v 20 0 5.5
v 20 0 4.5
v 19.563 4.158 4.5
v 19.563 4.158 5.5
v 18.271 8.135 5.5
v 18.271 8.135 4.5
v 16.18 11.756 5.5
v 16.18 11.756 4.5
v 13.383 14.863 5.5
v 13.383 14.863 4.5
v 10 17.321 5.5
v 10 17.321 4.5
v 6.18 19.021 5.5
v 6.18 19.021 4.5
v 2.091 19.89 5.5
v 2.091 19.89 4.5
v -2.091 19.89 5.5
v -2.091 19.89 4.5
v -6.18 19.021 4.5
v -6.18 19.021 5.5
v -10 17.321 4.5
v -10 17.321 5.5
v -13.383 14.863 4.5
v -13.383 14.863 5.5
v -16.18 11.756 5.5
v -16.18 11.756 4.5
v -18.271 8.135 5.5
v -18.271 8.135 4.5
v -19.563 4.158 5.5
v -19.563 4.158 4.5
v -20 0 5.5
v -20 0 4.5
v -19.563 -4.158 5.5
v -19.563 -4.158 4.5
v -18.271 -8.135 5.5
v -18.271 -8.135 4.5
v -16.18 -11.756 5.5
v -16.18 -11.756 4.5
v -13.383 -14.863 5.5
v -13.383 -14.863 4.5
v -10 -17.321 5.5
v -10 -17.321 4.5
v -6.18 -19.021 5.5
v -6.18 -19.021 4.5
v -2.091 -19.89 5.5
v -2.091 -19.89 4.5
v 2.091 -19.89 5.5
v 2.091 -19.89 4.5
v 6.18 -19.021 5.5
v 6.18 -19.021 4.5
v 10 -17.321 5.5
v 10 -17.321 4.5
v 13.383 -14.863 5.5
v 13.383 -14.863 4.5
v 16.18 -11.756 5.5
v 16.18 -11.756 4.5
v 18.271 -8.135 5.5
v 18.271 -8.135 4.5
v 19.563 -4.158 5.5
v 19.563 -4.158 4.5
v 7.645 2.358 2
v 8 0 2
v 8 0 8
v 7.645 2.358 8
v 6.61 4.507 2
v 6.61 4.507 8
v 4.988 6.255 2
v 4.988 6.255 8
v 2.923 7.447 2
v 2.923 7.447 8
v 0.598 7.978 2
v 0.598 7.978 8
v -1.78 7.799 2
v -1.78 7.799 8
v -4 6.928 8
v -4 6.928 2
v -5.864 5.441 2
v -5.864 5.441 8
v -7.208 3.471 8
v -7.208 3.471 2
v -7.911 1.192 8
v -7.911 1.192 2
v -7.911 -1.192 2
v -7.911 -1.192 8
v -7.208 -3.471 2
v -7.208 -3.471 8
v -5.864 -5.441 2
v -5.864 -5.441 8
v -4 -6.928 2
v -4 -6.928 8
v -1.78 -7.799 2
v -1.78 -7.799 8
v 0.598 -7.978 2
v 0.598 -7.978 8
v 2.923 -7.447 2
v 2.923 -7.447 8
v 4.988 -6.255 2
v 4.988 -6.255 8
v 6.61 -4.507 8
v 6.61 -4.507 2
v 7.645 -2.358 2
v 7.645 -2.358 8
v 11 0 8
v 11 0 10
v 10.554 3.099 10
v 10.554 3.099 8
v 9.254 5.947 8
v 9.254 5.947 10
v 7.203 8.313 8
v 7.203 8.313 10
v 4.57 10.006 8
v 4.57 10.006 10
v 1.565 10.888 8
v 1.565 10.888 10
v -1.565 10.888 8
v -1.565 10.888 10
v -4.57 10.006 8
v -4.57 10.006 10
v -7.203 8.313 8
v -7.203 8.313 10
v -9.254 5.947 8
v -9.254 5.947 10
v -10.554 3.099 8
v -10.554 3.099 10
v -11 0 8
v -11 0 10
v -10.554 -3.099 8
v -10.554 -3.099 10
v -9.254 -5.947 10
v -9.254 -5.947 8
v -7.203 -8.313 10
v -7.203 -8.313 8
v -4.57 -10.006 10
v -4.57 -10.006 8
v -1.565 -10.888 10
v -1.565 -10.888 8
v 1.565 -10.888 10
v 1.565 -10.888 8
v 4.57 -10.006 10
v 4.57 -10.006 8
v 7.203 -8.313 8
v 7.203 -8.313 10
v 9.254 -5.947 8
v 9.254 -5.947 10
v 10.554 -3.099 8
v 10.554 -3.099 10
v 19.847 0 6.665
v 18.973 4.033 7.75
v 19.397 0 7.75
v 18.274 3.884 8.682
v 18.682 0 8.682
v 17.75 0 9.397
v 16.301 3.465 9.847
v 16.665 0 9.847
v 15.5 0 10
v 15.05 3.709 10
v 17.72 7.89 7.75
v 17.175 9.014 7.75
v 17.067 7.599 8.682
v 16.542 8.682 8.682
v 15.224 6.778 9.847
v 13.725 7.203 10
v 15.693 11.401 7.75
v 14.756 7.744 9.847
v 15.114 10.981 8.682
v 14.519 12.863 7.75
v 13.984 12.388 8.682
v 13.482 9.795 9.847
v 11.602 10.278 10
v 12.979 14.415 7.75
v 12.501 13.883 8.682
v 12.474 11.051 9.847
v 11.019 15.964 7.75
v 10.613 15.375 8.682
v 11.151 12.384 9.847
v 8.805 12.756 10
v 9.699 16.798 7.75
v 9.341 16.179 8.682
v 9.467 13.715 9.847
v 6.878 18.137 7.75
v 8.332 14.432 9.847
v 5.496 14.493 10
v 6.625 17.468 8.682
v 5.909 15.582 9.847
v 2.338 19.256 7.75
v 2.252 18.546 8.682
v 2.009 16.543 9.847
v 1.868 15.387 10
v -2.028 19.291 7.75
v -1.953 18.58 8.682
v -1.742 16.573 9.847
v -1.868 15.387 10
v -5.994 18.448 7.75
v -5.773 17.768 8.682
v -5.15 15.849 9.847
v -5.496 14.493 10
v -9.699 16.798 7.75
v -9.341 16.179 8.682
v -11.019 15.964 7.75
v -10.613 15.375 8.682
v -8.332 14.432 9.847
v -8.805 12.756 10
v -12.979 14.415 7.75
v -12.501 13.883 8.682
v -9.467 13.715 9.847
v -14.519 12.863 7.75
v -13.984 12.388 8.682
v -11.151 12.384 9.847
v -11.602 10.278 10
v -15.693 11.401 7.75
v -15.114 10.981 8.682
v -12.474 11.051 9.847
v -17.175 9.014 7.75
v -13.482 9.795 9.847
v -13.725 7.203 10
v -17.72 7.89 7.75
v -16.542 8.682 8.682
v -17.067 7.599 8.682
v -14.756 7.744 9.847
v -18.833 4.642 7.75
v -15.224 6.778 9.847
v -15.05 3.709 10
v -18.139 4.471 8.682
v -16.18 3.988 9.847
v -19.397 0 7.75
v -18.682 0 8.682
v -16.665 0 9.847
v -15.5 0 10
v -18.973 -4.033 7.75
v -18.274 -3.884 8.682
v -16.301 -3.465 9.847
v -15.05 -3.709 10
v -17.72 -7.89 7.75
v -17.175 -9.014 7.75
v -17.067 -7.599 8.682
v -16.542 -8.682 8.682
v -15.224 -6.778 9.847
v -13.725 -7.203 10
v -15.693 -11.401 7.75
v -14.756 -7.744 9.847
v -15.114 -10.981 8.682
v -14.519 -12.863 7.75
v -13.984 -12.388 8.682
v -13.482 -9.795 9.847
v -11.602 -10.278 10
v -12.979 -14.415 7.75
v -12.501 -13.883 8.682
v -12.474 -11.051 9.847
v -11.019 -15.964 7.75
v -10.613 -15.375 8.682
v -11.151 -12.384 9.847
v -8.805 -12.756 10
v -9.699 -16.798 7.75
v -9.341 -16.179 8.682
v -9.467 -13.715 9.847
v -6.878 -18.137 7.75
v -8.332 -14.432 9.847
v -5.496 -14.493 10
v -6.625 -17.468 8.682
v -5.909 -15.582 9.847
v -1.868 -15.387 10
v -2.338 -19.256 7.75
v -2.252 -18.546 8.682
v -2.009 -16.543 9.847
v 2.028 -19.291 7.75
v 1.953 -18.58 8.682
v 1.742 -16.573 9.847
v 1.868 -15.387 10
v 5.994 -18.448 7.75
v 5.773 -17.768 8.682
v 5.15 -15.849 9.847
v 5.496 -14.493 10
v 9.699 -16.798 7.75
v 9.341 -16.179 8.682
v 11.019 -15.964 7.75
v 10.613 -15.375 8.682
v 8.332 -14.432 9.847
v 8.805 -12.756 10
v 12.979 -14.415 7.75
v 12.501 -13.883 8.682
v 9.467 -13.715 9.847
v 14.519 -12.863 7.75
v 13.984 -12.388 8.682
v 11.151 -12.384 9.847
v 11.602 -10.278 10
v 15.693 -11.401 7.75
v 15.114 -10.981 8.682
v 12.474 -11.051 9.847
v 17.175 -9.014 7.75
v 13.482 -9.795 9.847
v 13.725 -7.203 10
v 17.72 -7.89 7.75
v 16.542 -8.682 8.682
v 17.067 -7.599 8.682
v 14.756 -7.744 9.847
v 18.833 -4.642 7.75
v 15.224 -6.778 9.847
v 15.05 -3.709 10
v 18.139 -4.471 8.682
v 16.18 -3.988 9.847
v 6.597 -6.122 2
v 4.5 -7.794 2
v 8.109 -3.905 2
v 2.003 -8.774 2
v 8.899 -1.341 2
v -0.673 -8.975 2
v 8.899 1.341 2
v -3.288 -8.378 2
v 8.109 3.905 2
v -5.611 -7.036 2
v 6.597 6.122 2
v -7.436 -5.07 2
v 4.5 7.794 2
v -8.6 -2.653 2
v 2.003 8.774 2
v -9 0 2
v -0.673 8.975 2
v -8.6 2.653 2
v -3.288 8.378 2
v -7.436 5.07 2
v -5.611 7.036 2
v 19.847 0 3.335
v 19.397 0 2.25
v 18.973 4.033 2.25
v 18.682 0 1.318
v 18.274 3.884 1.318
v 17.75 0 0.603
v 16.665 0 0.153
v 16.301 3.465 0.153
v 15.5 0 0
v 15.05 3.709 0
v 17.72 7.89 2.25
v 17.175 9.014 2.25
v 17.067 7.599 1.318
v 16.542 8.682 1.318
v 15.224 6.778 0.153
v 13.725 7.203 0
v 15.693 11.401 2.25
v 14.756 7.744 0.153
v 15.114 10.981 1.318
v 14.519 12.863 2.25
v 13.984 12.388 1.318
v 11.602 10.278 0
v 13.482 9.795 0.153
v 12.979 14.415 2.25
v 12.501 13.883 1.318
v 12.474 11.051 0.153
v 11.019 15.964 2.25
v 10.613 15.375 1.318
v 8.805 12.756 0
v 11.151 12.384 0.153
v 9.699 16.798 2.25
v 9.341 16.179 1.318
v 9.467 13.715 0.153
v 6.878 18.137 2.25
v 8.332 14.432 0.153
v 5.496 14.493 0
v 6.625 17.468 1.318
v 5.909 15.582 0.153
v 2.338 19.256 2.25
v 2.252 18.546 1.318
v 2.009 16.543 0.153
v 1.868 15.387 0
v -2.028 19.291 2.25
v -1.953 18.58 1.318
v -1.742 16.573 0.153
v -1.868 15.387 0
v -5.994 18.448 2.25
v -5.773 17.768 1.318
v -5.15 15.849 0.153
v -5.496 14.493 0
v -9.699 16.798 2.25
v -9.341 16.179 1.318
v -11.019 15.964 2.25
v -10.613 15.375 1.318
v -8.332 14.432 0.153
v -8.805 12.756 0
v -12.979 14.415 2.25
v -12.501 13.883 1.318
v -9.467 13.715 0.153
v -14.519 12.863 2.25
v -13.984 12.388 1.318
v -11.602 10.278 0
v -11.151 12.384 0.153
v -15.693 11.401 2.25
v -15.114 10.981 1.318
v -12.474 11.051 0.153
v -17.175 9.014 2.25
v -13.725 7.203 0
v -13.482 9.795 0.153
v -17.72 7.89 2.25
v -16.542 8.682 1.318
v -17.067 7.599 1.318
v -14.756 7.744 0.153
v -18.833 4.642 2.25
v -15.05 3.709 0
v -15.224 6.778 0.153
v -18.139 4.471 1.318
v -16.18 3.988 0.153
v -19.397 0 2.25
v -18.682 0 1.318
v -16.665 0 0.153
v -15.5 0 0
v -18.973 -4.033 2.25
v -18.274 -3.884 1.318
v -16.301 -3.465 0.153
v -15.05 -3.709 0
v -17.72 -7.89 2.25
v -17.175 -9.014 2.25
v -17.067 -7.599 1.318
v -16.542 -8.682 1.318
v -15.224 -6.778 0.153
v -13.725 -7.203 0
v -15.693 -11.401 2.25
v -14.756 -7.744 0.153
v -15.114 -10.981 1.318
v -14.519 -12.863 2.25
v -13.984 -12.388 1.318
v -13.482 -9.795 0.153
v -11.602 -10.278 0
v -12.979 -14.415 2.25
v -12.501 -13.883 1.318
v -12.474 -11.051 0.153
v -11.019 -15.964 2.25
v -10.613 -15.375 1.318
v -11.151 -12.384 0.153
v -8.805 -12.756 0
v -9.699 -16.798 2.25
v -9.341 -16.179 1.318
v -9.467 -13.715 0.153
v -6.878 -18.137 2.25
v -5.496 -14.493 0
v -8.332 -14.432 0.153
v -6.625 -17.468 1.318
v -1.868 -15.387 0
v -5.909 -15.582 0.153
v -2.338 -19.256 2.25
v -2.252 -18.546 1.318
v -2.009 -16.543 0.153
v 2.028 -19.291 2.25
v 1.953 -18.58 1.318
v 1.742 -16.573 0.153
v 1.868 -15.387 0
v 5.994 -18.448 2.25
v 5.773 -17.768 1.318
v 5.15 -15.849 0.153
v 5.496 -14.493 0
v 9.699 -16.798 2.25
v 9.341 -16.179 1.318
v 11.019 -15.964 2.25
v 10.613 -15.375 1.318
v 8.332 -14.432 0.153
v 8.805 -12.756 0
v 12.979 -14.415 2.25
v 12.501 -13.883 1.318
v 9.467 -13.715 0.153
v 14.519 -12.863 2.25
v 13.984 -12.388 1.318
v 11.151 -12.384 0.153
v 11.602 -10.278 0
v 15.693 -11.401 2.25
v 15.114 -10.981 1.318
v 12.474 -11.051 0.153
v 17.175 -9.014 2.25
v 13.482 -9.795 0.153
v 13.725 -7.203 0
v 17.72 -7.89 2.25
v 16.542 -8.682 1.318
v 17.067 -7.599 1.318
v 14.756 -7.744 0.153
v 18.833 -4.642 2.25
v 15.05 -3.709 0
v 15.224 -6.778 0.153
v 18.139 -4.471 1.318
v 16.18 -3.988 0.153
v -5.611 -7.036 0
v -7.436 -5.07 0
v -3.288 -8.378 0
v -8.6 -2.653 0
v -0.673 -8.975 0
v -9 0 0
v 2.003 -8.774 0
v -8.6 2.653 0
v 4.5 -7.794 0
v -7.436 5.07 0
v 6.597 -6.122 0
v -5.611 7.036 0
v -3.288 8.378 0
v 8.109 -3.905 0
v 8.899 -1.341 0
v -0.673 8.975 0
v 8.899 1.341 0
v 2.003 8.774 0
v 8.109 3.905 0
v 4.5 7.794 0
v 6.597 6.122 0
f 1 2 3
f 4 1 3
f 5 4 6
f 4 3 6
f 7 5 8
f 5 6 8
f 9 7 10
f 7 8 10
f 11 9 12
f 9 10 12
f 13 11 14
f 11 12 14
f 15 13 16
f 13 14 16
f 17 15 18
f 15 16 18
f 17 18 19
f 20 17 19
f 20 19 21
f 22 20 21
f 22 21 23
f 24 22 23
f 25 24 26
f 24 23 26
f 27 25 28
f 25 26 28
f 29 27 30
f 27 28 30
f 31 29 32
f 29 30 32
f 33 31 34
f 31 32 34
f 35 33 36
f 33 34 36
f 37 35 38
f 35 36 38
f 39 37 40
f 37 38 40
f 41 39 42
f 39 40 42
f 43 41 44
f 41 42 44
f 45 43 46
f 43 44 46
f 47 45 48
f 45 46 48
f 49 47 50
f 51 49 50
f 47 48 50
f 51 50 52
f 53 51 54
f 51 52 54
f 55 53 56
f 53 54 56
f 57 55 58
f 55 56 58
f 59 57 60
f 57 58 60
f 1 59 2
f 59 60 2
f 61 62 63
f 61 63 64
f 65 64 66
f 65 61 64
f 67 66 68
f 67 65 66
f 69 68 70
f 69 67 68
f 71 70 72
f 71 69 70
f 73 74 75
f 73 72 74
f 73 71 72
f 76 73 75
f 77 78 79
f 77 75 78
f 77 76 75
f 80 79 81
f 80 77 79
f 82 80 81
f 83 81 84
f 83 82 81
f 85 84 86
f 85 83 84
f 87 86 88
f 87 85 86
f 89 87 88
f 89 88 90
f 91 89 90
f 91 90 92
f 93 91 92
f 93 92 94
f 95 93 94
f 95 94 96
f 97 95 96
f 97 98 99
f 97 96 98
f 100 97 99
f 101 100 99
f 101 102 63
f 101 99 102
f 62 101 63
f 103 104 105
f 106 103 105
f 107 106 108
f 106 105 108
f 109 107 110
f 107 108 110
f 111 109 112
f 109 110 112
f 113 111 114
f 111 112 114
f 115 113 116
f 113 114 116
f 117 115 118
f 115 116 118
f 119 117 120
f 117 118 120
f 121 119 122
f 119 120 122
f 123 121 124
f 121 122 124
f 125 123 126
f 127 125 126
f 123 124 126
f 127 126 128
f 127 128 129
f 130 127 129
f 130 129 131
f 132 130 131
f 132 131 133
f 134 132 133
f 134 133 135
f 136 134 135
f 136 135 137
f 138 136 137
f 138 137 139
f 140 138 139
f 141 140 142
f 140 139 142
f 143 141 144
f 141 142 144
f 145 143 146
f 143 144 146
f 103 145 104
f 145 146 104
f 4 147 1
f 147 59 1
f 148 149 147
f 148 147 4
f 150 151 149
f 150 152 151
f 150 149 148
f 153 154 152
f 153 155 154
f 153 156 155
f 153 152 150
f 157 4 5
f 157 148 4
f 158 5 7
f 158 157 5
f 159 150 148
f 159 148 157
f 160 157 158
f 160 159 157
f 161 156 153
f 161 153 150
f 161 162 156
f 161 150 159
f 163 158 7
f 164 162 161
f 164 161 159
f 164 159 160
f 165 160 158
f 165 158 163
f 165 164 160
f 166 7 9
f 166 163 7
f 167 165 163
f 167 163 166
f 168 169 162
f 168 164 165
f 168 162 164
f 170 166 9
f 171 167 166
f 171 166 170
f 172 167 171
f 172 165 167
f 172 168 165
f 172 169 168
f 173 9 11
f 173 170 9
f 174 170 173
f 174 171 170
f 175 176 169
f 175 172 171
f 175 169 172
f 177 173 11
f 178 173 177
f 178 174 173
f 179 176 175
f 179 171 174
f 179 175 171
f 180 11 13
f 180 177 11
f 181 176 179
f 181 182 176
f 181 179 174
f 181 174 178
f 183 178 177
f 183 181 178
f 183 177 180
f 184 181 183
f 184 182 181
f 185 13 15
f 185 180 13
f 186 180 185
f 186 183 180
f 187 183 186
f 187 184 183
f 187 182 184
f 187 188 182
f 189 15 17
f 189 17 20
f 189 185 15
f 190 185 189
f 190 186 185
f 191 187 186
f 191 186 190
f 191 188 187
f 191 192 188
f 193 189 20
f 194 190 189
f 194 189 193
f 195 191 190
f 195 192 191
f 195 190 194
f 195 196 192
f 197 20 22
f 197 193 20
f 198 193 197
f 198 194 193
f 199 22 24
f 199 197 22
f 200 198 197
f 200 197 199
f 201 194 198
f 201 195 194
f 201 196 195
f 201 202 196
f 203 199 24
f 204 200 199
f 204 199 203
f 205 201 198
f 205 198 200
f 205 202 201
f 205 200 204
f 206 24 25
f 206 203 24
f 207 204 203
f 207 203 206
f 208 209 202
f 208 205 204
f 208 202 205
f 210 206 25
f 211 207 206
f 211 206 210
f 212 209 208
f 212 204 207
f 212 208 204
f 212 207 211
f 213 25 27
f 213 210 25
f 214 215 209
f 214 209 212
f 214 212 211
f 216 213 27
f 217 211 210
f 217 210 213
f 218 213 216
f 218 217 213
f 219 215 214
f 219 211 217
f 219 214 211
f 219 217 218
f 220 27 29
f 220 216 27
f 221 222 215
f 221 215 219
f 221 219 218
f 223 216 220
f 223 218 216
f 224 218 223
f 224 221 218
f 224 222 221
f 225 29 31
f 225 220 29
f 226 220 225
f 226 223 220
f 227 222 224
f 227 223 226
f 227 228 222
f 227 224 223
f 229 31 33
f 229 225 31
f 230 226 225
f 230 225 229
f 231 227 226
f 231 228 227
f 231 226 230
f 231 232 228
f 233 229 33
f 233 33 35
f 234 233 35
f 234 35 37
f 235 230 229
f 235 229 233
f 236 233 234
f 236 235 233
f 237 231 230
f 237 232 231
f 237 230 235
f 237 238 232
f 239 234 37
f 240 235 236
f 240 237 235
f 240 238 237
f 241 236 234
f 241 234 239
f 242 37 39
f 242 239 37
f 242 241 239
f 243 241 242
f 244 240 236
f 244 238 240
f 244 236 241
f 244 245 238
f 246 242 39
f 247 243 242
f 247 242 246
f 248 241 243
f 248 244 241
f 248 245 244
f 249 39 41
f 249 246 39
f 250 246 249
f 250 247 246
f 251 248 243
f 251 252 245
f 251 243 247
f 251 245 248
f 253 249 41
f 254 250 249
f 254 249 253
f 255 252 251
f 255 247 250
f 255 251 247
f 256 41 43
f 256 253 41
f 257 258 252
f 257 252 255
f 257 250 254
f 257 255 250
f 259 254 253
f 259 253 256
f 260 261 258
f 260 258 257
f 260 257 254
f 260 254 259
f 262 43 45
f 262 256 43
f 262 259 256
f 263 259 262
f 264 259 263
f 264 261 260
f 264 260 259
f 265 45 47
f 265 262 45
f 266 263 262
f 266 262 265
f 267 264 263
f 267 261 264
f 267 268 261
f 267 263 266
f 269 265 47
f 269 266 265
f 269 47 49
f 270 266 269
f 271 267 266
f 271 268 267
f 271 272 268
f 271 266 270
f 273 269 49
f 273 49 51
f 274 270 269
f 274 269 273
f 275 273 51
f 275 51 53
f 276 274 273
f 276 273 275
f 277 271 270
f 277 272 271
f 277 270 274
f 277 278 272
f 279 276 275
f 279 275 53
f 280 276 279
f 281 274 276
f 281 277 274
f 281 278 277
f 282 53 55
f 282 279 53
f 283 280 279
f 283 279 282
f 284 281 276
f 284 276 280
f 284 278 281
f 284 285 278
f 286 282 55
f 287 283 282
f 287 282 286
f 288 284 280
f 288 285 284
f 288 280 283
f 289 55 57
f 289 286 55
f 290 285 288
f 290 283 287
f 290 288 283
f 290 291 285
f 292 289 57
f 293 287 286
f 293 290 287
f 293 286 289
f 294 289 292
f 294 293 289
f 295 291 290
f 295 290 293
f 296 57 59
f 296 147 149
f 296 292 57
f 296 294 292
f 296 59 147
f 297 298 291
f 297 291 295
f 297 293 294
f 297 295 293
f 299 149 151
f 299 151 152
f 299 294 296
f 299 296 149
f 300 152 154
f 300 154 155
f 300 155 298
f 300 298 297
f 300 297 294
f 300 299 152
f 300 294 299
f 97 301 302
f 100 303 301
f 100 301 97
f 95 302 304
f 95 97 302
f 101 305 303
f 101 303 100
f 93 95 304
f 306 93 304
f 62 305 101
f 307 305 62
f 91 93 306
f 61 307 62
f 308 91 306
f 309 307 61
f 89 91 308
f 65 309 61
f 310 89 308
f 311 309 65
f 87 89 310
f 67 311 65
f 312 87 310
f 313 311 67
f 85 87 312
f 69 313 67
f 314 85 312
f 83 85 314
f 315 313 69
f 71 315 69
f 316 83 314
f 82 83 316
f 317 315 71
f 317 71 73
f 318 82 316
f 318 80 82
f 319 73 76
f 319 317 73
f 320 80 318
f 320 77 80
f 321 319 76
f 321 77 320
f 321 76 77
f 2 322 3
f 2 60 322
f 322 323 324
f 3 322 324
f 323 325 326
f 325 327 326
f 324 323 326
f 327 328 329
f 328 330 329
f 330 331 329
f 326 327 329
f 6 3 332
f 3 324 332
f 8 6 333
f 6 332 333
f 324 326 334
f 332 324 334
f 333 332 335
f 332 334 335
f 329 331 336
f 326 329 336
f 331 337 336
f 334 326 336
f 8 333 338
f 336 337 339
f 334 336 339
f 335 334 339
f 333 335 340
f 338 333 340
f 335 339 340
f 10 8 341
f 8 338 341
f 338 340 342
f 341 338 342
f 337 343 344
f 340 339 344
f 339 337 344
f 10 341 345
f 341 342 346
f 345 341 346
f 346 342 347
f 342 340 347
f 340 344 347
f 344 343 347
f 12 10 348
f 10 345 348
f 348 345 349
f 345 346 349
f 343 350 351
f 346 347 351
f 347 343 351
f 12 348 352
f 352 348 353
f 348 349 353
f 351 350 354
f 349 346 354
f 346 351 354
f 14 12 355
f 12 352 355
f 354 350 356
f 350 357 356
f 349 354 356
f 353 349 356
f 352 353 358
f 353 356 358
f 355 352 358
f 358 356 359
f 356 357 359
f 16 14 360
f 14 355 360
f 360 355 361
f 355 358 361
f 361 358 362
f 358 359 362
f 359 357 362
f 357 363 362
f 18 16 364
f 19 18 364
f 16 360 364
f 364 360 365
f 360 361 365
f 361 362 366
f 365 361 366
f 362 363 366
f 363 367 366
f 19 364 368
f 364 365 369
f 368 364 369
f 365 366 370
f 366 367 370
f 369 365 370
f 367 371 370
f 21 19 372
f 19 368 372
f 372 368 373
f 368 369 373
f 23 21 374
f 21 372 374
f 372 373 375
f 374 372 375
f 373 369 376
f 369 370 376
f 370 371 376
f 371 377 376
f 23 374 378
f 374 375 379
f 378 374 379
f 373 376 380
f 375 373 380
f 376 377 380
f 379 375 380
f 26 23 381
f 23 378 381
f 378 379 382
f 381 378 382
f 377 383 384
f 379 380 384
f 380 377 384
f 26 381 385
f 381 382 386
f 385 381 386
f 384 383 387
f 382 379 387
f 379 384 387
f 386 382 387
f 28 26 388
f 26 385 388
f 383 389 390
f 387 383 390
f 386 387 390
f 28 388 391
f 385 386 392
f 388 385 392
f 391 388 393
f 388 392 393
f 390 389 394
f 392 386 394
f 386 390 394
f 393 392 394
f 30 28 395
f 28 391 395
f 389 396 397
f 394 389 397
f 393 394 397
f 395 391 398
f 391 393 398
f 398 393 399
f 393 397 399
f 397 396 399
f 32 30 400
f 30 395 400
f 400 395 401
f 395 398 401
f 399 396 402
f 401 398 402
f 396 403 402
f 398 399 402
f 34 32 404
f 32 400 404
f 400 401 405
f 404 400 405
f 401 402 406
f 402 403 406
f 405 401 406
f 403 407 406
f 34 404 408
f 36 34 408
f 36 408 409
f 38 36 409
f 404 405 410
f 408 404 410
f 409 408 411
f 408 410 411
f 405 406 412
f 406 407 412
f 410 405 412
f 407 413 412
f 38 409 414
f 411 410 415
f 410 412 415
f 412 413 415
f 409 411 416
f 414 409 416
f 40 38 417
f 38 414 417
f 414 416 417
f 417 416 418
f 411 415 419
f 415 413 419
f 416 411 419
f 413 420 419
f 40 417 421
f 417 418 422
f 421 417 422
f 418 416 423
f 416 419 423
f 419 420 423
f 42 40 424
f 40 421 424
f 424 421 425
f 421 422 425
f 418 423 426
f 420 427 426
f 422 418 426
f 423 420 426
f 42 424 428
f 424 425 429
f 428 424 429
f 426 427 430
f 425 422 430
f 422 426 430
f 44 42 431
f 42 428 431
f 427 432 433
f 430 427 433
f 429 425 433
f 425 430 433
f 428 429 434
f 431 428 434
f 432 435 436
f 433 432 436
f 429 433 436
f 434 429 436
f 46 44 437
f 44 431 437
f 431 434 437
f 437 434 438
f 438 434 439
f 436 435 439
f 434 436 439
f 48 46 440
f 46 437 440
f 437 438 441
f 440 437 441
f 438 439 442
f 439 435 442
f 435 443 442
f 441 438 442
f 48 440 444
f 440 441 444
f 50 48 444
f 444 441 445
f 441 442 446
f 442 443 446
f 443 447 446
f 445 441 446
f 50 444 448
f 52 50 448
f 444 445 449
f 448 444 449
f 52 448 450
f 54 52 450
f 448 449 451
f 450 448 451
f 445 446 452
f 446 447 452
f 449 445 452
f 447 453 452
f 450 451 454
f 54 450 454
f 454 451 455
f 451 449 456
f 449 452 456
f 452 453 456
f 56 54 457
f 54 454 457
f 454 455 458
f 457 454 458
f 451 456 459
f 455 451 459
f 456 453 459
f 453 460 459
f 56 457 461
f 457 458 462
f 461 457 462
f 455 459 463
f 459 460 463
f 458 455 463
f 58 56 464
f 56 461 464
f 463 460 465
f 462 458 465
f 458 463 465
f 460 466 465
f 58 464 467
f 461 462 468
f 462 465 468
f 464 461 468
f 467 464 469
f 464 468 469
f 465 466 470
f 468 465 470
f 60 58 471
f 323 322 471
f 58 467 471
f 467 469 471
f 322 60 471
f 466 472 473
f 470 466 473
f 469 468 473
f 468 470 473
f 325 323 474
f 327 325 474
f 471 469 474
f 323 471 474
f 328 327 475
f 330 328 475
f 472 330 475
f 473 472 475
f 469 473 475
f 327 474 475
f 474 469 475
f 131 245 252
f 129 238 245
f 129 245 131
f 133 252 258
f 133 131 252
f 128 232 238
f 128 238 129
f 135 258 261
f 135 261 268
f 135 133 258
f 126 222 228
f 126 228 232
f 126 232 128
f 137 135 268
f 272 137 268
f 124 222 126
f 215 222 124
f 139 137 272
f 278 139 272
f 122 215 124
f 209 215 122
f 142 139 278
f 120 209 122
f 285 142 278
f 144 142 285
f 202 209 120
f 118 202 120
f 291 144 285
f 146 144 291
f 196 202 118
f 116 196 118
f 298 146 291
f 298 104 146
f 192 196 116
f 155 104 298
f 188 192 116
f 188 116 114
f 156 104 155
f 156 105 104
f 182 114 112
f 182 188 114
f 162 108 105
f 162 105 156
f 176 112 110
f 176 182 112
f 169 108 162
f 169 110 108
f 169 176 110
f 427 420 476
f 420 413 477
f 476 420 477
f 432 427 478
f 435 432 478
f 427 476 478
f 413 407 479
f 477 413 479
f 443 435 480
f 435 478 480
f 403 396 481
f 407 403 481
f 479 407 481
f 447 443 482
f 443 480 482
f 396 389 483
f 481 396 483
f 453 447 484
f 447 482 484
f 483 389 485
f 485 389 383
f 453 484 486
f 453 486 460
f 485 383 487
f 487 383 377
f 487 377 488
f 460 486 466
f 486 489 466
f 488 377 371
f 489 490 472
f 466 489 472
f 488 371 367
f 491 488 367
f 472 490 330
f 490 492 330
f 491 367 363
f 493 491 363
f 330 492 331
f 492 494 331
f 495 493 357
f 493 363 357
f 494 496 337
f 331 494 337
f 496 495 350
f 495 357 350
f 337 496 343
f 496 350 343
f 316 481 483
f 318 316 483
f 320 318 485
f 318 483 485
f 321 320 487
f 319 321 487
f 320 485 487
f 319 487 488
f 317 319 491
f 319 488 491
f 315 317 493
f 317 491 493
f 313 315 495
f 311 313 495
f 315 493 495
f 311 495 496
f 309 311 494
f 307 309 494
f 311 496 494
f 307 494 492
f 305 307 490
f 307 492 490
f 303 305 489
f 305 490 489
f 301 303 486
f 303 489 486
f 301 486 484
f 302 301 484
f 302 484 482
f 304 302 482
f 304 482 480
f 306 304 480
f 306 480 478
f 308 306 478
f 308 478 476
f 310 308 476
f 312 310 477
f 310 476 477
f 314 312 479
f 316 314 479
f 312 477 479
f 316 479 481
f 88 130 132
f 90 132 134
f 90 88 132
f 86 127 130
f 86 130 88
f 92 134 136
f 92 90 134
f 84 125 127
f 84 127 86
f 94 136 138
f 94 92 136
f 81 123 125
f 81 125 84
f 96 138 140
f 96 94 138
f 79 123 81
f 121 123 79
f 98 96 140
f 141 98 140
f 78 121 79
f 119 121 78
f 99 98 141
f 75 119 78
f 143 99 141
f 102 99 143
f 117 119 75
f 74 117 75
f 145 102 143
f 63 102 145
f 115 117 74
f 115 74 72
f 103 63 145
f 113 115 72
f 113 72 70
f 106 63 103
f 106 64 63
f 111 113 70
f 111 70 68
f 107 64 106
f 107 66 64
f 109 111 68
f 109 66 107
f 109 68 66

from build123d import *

# Parameters (mm, degrees)
SKETCH1_R           = 20
SKETCH1_R_2         = 8
BOSS_EXTRUDE1_DEPTH = 10
FILLET1_R           = 4.5
SKETCH2_R           = 9
CUT_EXTRUDE1_DEPTH  = 2
SKETCH5_R           = 11
CUT_EXTRUDE2_DEPTH  = 2


with BuildPart() as part:
    # Sketch1 → Boss-Extrude1 (new body)
    with BuildSketch(Plane.XY):
        Circle(SKETCH1_R)
        Circle(SKETCH1_R_2, mode=Mode.SUBTRACT)
    extrude(amount=BOSS_EXTRUDE1_DEPTH)

    # Fillet1
    fillet1_edges = [part.edges().sort_by_distance(p)[0] for p in [
        (-20, 0, 0),
        (-20, 0, 10),
    ]]
    fillet(fillet1_edges, radius=FILLET1_R)

    # Sketch2 → Cut-Extrude1 (cut)
    with BuildSketch(Plane(origin=(0, 0, 0), x_dir=(-1, 0, 0), z_dir=(0, 0, -1))):
        Circle(SKETCH2_R)
    extrude(amount=-CUT_EXTRUDE1_DEPTH, mode=Mode.SUBTRACT)

    # Sketch5 → Cut-Extrude2 (cut)
    with BuildSketch(Plane.XY.offset(10)):
        Circle(SKETCH5_R)
    extrude(amount=-CUT_EXTRUDE2_DEPTH, mode=Mode.SUBTRACT)


solid = part.part
